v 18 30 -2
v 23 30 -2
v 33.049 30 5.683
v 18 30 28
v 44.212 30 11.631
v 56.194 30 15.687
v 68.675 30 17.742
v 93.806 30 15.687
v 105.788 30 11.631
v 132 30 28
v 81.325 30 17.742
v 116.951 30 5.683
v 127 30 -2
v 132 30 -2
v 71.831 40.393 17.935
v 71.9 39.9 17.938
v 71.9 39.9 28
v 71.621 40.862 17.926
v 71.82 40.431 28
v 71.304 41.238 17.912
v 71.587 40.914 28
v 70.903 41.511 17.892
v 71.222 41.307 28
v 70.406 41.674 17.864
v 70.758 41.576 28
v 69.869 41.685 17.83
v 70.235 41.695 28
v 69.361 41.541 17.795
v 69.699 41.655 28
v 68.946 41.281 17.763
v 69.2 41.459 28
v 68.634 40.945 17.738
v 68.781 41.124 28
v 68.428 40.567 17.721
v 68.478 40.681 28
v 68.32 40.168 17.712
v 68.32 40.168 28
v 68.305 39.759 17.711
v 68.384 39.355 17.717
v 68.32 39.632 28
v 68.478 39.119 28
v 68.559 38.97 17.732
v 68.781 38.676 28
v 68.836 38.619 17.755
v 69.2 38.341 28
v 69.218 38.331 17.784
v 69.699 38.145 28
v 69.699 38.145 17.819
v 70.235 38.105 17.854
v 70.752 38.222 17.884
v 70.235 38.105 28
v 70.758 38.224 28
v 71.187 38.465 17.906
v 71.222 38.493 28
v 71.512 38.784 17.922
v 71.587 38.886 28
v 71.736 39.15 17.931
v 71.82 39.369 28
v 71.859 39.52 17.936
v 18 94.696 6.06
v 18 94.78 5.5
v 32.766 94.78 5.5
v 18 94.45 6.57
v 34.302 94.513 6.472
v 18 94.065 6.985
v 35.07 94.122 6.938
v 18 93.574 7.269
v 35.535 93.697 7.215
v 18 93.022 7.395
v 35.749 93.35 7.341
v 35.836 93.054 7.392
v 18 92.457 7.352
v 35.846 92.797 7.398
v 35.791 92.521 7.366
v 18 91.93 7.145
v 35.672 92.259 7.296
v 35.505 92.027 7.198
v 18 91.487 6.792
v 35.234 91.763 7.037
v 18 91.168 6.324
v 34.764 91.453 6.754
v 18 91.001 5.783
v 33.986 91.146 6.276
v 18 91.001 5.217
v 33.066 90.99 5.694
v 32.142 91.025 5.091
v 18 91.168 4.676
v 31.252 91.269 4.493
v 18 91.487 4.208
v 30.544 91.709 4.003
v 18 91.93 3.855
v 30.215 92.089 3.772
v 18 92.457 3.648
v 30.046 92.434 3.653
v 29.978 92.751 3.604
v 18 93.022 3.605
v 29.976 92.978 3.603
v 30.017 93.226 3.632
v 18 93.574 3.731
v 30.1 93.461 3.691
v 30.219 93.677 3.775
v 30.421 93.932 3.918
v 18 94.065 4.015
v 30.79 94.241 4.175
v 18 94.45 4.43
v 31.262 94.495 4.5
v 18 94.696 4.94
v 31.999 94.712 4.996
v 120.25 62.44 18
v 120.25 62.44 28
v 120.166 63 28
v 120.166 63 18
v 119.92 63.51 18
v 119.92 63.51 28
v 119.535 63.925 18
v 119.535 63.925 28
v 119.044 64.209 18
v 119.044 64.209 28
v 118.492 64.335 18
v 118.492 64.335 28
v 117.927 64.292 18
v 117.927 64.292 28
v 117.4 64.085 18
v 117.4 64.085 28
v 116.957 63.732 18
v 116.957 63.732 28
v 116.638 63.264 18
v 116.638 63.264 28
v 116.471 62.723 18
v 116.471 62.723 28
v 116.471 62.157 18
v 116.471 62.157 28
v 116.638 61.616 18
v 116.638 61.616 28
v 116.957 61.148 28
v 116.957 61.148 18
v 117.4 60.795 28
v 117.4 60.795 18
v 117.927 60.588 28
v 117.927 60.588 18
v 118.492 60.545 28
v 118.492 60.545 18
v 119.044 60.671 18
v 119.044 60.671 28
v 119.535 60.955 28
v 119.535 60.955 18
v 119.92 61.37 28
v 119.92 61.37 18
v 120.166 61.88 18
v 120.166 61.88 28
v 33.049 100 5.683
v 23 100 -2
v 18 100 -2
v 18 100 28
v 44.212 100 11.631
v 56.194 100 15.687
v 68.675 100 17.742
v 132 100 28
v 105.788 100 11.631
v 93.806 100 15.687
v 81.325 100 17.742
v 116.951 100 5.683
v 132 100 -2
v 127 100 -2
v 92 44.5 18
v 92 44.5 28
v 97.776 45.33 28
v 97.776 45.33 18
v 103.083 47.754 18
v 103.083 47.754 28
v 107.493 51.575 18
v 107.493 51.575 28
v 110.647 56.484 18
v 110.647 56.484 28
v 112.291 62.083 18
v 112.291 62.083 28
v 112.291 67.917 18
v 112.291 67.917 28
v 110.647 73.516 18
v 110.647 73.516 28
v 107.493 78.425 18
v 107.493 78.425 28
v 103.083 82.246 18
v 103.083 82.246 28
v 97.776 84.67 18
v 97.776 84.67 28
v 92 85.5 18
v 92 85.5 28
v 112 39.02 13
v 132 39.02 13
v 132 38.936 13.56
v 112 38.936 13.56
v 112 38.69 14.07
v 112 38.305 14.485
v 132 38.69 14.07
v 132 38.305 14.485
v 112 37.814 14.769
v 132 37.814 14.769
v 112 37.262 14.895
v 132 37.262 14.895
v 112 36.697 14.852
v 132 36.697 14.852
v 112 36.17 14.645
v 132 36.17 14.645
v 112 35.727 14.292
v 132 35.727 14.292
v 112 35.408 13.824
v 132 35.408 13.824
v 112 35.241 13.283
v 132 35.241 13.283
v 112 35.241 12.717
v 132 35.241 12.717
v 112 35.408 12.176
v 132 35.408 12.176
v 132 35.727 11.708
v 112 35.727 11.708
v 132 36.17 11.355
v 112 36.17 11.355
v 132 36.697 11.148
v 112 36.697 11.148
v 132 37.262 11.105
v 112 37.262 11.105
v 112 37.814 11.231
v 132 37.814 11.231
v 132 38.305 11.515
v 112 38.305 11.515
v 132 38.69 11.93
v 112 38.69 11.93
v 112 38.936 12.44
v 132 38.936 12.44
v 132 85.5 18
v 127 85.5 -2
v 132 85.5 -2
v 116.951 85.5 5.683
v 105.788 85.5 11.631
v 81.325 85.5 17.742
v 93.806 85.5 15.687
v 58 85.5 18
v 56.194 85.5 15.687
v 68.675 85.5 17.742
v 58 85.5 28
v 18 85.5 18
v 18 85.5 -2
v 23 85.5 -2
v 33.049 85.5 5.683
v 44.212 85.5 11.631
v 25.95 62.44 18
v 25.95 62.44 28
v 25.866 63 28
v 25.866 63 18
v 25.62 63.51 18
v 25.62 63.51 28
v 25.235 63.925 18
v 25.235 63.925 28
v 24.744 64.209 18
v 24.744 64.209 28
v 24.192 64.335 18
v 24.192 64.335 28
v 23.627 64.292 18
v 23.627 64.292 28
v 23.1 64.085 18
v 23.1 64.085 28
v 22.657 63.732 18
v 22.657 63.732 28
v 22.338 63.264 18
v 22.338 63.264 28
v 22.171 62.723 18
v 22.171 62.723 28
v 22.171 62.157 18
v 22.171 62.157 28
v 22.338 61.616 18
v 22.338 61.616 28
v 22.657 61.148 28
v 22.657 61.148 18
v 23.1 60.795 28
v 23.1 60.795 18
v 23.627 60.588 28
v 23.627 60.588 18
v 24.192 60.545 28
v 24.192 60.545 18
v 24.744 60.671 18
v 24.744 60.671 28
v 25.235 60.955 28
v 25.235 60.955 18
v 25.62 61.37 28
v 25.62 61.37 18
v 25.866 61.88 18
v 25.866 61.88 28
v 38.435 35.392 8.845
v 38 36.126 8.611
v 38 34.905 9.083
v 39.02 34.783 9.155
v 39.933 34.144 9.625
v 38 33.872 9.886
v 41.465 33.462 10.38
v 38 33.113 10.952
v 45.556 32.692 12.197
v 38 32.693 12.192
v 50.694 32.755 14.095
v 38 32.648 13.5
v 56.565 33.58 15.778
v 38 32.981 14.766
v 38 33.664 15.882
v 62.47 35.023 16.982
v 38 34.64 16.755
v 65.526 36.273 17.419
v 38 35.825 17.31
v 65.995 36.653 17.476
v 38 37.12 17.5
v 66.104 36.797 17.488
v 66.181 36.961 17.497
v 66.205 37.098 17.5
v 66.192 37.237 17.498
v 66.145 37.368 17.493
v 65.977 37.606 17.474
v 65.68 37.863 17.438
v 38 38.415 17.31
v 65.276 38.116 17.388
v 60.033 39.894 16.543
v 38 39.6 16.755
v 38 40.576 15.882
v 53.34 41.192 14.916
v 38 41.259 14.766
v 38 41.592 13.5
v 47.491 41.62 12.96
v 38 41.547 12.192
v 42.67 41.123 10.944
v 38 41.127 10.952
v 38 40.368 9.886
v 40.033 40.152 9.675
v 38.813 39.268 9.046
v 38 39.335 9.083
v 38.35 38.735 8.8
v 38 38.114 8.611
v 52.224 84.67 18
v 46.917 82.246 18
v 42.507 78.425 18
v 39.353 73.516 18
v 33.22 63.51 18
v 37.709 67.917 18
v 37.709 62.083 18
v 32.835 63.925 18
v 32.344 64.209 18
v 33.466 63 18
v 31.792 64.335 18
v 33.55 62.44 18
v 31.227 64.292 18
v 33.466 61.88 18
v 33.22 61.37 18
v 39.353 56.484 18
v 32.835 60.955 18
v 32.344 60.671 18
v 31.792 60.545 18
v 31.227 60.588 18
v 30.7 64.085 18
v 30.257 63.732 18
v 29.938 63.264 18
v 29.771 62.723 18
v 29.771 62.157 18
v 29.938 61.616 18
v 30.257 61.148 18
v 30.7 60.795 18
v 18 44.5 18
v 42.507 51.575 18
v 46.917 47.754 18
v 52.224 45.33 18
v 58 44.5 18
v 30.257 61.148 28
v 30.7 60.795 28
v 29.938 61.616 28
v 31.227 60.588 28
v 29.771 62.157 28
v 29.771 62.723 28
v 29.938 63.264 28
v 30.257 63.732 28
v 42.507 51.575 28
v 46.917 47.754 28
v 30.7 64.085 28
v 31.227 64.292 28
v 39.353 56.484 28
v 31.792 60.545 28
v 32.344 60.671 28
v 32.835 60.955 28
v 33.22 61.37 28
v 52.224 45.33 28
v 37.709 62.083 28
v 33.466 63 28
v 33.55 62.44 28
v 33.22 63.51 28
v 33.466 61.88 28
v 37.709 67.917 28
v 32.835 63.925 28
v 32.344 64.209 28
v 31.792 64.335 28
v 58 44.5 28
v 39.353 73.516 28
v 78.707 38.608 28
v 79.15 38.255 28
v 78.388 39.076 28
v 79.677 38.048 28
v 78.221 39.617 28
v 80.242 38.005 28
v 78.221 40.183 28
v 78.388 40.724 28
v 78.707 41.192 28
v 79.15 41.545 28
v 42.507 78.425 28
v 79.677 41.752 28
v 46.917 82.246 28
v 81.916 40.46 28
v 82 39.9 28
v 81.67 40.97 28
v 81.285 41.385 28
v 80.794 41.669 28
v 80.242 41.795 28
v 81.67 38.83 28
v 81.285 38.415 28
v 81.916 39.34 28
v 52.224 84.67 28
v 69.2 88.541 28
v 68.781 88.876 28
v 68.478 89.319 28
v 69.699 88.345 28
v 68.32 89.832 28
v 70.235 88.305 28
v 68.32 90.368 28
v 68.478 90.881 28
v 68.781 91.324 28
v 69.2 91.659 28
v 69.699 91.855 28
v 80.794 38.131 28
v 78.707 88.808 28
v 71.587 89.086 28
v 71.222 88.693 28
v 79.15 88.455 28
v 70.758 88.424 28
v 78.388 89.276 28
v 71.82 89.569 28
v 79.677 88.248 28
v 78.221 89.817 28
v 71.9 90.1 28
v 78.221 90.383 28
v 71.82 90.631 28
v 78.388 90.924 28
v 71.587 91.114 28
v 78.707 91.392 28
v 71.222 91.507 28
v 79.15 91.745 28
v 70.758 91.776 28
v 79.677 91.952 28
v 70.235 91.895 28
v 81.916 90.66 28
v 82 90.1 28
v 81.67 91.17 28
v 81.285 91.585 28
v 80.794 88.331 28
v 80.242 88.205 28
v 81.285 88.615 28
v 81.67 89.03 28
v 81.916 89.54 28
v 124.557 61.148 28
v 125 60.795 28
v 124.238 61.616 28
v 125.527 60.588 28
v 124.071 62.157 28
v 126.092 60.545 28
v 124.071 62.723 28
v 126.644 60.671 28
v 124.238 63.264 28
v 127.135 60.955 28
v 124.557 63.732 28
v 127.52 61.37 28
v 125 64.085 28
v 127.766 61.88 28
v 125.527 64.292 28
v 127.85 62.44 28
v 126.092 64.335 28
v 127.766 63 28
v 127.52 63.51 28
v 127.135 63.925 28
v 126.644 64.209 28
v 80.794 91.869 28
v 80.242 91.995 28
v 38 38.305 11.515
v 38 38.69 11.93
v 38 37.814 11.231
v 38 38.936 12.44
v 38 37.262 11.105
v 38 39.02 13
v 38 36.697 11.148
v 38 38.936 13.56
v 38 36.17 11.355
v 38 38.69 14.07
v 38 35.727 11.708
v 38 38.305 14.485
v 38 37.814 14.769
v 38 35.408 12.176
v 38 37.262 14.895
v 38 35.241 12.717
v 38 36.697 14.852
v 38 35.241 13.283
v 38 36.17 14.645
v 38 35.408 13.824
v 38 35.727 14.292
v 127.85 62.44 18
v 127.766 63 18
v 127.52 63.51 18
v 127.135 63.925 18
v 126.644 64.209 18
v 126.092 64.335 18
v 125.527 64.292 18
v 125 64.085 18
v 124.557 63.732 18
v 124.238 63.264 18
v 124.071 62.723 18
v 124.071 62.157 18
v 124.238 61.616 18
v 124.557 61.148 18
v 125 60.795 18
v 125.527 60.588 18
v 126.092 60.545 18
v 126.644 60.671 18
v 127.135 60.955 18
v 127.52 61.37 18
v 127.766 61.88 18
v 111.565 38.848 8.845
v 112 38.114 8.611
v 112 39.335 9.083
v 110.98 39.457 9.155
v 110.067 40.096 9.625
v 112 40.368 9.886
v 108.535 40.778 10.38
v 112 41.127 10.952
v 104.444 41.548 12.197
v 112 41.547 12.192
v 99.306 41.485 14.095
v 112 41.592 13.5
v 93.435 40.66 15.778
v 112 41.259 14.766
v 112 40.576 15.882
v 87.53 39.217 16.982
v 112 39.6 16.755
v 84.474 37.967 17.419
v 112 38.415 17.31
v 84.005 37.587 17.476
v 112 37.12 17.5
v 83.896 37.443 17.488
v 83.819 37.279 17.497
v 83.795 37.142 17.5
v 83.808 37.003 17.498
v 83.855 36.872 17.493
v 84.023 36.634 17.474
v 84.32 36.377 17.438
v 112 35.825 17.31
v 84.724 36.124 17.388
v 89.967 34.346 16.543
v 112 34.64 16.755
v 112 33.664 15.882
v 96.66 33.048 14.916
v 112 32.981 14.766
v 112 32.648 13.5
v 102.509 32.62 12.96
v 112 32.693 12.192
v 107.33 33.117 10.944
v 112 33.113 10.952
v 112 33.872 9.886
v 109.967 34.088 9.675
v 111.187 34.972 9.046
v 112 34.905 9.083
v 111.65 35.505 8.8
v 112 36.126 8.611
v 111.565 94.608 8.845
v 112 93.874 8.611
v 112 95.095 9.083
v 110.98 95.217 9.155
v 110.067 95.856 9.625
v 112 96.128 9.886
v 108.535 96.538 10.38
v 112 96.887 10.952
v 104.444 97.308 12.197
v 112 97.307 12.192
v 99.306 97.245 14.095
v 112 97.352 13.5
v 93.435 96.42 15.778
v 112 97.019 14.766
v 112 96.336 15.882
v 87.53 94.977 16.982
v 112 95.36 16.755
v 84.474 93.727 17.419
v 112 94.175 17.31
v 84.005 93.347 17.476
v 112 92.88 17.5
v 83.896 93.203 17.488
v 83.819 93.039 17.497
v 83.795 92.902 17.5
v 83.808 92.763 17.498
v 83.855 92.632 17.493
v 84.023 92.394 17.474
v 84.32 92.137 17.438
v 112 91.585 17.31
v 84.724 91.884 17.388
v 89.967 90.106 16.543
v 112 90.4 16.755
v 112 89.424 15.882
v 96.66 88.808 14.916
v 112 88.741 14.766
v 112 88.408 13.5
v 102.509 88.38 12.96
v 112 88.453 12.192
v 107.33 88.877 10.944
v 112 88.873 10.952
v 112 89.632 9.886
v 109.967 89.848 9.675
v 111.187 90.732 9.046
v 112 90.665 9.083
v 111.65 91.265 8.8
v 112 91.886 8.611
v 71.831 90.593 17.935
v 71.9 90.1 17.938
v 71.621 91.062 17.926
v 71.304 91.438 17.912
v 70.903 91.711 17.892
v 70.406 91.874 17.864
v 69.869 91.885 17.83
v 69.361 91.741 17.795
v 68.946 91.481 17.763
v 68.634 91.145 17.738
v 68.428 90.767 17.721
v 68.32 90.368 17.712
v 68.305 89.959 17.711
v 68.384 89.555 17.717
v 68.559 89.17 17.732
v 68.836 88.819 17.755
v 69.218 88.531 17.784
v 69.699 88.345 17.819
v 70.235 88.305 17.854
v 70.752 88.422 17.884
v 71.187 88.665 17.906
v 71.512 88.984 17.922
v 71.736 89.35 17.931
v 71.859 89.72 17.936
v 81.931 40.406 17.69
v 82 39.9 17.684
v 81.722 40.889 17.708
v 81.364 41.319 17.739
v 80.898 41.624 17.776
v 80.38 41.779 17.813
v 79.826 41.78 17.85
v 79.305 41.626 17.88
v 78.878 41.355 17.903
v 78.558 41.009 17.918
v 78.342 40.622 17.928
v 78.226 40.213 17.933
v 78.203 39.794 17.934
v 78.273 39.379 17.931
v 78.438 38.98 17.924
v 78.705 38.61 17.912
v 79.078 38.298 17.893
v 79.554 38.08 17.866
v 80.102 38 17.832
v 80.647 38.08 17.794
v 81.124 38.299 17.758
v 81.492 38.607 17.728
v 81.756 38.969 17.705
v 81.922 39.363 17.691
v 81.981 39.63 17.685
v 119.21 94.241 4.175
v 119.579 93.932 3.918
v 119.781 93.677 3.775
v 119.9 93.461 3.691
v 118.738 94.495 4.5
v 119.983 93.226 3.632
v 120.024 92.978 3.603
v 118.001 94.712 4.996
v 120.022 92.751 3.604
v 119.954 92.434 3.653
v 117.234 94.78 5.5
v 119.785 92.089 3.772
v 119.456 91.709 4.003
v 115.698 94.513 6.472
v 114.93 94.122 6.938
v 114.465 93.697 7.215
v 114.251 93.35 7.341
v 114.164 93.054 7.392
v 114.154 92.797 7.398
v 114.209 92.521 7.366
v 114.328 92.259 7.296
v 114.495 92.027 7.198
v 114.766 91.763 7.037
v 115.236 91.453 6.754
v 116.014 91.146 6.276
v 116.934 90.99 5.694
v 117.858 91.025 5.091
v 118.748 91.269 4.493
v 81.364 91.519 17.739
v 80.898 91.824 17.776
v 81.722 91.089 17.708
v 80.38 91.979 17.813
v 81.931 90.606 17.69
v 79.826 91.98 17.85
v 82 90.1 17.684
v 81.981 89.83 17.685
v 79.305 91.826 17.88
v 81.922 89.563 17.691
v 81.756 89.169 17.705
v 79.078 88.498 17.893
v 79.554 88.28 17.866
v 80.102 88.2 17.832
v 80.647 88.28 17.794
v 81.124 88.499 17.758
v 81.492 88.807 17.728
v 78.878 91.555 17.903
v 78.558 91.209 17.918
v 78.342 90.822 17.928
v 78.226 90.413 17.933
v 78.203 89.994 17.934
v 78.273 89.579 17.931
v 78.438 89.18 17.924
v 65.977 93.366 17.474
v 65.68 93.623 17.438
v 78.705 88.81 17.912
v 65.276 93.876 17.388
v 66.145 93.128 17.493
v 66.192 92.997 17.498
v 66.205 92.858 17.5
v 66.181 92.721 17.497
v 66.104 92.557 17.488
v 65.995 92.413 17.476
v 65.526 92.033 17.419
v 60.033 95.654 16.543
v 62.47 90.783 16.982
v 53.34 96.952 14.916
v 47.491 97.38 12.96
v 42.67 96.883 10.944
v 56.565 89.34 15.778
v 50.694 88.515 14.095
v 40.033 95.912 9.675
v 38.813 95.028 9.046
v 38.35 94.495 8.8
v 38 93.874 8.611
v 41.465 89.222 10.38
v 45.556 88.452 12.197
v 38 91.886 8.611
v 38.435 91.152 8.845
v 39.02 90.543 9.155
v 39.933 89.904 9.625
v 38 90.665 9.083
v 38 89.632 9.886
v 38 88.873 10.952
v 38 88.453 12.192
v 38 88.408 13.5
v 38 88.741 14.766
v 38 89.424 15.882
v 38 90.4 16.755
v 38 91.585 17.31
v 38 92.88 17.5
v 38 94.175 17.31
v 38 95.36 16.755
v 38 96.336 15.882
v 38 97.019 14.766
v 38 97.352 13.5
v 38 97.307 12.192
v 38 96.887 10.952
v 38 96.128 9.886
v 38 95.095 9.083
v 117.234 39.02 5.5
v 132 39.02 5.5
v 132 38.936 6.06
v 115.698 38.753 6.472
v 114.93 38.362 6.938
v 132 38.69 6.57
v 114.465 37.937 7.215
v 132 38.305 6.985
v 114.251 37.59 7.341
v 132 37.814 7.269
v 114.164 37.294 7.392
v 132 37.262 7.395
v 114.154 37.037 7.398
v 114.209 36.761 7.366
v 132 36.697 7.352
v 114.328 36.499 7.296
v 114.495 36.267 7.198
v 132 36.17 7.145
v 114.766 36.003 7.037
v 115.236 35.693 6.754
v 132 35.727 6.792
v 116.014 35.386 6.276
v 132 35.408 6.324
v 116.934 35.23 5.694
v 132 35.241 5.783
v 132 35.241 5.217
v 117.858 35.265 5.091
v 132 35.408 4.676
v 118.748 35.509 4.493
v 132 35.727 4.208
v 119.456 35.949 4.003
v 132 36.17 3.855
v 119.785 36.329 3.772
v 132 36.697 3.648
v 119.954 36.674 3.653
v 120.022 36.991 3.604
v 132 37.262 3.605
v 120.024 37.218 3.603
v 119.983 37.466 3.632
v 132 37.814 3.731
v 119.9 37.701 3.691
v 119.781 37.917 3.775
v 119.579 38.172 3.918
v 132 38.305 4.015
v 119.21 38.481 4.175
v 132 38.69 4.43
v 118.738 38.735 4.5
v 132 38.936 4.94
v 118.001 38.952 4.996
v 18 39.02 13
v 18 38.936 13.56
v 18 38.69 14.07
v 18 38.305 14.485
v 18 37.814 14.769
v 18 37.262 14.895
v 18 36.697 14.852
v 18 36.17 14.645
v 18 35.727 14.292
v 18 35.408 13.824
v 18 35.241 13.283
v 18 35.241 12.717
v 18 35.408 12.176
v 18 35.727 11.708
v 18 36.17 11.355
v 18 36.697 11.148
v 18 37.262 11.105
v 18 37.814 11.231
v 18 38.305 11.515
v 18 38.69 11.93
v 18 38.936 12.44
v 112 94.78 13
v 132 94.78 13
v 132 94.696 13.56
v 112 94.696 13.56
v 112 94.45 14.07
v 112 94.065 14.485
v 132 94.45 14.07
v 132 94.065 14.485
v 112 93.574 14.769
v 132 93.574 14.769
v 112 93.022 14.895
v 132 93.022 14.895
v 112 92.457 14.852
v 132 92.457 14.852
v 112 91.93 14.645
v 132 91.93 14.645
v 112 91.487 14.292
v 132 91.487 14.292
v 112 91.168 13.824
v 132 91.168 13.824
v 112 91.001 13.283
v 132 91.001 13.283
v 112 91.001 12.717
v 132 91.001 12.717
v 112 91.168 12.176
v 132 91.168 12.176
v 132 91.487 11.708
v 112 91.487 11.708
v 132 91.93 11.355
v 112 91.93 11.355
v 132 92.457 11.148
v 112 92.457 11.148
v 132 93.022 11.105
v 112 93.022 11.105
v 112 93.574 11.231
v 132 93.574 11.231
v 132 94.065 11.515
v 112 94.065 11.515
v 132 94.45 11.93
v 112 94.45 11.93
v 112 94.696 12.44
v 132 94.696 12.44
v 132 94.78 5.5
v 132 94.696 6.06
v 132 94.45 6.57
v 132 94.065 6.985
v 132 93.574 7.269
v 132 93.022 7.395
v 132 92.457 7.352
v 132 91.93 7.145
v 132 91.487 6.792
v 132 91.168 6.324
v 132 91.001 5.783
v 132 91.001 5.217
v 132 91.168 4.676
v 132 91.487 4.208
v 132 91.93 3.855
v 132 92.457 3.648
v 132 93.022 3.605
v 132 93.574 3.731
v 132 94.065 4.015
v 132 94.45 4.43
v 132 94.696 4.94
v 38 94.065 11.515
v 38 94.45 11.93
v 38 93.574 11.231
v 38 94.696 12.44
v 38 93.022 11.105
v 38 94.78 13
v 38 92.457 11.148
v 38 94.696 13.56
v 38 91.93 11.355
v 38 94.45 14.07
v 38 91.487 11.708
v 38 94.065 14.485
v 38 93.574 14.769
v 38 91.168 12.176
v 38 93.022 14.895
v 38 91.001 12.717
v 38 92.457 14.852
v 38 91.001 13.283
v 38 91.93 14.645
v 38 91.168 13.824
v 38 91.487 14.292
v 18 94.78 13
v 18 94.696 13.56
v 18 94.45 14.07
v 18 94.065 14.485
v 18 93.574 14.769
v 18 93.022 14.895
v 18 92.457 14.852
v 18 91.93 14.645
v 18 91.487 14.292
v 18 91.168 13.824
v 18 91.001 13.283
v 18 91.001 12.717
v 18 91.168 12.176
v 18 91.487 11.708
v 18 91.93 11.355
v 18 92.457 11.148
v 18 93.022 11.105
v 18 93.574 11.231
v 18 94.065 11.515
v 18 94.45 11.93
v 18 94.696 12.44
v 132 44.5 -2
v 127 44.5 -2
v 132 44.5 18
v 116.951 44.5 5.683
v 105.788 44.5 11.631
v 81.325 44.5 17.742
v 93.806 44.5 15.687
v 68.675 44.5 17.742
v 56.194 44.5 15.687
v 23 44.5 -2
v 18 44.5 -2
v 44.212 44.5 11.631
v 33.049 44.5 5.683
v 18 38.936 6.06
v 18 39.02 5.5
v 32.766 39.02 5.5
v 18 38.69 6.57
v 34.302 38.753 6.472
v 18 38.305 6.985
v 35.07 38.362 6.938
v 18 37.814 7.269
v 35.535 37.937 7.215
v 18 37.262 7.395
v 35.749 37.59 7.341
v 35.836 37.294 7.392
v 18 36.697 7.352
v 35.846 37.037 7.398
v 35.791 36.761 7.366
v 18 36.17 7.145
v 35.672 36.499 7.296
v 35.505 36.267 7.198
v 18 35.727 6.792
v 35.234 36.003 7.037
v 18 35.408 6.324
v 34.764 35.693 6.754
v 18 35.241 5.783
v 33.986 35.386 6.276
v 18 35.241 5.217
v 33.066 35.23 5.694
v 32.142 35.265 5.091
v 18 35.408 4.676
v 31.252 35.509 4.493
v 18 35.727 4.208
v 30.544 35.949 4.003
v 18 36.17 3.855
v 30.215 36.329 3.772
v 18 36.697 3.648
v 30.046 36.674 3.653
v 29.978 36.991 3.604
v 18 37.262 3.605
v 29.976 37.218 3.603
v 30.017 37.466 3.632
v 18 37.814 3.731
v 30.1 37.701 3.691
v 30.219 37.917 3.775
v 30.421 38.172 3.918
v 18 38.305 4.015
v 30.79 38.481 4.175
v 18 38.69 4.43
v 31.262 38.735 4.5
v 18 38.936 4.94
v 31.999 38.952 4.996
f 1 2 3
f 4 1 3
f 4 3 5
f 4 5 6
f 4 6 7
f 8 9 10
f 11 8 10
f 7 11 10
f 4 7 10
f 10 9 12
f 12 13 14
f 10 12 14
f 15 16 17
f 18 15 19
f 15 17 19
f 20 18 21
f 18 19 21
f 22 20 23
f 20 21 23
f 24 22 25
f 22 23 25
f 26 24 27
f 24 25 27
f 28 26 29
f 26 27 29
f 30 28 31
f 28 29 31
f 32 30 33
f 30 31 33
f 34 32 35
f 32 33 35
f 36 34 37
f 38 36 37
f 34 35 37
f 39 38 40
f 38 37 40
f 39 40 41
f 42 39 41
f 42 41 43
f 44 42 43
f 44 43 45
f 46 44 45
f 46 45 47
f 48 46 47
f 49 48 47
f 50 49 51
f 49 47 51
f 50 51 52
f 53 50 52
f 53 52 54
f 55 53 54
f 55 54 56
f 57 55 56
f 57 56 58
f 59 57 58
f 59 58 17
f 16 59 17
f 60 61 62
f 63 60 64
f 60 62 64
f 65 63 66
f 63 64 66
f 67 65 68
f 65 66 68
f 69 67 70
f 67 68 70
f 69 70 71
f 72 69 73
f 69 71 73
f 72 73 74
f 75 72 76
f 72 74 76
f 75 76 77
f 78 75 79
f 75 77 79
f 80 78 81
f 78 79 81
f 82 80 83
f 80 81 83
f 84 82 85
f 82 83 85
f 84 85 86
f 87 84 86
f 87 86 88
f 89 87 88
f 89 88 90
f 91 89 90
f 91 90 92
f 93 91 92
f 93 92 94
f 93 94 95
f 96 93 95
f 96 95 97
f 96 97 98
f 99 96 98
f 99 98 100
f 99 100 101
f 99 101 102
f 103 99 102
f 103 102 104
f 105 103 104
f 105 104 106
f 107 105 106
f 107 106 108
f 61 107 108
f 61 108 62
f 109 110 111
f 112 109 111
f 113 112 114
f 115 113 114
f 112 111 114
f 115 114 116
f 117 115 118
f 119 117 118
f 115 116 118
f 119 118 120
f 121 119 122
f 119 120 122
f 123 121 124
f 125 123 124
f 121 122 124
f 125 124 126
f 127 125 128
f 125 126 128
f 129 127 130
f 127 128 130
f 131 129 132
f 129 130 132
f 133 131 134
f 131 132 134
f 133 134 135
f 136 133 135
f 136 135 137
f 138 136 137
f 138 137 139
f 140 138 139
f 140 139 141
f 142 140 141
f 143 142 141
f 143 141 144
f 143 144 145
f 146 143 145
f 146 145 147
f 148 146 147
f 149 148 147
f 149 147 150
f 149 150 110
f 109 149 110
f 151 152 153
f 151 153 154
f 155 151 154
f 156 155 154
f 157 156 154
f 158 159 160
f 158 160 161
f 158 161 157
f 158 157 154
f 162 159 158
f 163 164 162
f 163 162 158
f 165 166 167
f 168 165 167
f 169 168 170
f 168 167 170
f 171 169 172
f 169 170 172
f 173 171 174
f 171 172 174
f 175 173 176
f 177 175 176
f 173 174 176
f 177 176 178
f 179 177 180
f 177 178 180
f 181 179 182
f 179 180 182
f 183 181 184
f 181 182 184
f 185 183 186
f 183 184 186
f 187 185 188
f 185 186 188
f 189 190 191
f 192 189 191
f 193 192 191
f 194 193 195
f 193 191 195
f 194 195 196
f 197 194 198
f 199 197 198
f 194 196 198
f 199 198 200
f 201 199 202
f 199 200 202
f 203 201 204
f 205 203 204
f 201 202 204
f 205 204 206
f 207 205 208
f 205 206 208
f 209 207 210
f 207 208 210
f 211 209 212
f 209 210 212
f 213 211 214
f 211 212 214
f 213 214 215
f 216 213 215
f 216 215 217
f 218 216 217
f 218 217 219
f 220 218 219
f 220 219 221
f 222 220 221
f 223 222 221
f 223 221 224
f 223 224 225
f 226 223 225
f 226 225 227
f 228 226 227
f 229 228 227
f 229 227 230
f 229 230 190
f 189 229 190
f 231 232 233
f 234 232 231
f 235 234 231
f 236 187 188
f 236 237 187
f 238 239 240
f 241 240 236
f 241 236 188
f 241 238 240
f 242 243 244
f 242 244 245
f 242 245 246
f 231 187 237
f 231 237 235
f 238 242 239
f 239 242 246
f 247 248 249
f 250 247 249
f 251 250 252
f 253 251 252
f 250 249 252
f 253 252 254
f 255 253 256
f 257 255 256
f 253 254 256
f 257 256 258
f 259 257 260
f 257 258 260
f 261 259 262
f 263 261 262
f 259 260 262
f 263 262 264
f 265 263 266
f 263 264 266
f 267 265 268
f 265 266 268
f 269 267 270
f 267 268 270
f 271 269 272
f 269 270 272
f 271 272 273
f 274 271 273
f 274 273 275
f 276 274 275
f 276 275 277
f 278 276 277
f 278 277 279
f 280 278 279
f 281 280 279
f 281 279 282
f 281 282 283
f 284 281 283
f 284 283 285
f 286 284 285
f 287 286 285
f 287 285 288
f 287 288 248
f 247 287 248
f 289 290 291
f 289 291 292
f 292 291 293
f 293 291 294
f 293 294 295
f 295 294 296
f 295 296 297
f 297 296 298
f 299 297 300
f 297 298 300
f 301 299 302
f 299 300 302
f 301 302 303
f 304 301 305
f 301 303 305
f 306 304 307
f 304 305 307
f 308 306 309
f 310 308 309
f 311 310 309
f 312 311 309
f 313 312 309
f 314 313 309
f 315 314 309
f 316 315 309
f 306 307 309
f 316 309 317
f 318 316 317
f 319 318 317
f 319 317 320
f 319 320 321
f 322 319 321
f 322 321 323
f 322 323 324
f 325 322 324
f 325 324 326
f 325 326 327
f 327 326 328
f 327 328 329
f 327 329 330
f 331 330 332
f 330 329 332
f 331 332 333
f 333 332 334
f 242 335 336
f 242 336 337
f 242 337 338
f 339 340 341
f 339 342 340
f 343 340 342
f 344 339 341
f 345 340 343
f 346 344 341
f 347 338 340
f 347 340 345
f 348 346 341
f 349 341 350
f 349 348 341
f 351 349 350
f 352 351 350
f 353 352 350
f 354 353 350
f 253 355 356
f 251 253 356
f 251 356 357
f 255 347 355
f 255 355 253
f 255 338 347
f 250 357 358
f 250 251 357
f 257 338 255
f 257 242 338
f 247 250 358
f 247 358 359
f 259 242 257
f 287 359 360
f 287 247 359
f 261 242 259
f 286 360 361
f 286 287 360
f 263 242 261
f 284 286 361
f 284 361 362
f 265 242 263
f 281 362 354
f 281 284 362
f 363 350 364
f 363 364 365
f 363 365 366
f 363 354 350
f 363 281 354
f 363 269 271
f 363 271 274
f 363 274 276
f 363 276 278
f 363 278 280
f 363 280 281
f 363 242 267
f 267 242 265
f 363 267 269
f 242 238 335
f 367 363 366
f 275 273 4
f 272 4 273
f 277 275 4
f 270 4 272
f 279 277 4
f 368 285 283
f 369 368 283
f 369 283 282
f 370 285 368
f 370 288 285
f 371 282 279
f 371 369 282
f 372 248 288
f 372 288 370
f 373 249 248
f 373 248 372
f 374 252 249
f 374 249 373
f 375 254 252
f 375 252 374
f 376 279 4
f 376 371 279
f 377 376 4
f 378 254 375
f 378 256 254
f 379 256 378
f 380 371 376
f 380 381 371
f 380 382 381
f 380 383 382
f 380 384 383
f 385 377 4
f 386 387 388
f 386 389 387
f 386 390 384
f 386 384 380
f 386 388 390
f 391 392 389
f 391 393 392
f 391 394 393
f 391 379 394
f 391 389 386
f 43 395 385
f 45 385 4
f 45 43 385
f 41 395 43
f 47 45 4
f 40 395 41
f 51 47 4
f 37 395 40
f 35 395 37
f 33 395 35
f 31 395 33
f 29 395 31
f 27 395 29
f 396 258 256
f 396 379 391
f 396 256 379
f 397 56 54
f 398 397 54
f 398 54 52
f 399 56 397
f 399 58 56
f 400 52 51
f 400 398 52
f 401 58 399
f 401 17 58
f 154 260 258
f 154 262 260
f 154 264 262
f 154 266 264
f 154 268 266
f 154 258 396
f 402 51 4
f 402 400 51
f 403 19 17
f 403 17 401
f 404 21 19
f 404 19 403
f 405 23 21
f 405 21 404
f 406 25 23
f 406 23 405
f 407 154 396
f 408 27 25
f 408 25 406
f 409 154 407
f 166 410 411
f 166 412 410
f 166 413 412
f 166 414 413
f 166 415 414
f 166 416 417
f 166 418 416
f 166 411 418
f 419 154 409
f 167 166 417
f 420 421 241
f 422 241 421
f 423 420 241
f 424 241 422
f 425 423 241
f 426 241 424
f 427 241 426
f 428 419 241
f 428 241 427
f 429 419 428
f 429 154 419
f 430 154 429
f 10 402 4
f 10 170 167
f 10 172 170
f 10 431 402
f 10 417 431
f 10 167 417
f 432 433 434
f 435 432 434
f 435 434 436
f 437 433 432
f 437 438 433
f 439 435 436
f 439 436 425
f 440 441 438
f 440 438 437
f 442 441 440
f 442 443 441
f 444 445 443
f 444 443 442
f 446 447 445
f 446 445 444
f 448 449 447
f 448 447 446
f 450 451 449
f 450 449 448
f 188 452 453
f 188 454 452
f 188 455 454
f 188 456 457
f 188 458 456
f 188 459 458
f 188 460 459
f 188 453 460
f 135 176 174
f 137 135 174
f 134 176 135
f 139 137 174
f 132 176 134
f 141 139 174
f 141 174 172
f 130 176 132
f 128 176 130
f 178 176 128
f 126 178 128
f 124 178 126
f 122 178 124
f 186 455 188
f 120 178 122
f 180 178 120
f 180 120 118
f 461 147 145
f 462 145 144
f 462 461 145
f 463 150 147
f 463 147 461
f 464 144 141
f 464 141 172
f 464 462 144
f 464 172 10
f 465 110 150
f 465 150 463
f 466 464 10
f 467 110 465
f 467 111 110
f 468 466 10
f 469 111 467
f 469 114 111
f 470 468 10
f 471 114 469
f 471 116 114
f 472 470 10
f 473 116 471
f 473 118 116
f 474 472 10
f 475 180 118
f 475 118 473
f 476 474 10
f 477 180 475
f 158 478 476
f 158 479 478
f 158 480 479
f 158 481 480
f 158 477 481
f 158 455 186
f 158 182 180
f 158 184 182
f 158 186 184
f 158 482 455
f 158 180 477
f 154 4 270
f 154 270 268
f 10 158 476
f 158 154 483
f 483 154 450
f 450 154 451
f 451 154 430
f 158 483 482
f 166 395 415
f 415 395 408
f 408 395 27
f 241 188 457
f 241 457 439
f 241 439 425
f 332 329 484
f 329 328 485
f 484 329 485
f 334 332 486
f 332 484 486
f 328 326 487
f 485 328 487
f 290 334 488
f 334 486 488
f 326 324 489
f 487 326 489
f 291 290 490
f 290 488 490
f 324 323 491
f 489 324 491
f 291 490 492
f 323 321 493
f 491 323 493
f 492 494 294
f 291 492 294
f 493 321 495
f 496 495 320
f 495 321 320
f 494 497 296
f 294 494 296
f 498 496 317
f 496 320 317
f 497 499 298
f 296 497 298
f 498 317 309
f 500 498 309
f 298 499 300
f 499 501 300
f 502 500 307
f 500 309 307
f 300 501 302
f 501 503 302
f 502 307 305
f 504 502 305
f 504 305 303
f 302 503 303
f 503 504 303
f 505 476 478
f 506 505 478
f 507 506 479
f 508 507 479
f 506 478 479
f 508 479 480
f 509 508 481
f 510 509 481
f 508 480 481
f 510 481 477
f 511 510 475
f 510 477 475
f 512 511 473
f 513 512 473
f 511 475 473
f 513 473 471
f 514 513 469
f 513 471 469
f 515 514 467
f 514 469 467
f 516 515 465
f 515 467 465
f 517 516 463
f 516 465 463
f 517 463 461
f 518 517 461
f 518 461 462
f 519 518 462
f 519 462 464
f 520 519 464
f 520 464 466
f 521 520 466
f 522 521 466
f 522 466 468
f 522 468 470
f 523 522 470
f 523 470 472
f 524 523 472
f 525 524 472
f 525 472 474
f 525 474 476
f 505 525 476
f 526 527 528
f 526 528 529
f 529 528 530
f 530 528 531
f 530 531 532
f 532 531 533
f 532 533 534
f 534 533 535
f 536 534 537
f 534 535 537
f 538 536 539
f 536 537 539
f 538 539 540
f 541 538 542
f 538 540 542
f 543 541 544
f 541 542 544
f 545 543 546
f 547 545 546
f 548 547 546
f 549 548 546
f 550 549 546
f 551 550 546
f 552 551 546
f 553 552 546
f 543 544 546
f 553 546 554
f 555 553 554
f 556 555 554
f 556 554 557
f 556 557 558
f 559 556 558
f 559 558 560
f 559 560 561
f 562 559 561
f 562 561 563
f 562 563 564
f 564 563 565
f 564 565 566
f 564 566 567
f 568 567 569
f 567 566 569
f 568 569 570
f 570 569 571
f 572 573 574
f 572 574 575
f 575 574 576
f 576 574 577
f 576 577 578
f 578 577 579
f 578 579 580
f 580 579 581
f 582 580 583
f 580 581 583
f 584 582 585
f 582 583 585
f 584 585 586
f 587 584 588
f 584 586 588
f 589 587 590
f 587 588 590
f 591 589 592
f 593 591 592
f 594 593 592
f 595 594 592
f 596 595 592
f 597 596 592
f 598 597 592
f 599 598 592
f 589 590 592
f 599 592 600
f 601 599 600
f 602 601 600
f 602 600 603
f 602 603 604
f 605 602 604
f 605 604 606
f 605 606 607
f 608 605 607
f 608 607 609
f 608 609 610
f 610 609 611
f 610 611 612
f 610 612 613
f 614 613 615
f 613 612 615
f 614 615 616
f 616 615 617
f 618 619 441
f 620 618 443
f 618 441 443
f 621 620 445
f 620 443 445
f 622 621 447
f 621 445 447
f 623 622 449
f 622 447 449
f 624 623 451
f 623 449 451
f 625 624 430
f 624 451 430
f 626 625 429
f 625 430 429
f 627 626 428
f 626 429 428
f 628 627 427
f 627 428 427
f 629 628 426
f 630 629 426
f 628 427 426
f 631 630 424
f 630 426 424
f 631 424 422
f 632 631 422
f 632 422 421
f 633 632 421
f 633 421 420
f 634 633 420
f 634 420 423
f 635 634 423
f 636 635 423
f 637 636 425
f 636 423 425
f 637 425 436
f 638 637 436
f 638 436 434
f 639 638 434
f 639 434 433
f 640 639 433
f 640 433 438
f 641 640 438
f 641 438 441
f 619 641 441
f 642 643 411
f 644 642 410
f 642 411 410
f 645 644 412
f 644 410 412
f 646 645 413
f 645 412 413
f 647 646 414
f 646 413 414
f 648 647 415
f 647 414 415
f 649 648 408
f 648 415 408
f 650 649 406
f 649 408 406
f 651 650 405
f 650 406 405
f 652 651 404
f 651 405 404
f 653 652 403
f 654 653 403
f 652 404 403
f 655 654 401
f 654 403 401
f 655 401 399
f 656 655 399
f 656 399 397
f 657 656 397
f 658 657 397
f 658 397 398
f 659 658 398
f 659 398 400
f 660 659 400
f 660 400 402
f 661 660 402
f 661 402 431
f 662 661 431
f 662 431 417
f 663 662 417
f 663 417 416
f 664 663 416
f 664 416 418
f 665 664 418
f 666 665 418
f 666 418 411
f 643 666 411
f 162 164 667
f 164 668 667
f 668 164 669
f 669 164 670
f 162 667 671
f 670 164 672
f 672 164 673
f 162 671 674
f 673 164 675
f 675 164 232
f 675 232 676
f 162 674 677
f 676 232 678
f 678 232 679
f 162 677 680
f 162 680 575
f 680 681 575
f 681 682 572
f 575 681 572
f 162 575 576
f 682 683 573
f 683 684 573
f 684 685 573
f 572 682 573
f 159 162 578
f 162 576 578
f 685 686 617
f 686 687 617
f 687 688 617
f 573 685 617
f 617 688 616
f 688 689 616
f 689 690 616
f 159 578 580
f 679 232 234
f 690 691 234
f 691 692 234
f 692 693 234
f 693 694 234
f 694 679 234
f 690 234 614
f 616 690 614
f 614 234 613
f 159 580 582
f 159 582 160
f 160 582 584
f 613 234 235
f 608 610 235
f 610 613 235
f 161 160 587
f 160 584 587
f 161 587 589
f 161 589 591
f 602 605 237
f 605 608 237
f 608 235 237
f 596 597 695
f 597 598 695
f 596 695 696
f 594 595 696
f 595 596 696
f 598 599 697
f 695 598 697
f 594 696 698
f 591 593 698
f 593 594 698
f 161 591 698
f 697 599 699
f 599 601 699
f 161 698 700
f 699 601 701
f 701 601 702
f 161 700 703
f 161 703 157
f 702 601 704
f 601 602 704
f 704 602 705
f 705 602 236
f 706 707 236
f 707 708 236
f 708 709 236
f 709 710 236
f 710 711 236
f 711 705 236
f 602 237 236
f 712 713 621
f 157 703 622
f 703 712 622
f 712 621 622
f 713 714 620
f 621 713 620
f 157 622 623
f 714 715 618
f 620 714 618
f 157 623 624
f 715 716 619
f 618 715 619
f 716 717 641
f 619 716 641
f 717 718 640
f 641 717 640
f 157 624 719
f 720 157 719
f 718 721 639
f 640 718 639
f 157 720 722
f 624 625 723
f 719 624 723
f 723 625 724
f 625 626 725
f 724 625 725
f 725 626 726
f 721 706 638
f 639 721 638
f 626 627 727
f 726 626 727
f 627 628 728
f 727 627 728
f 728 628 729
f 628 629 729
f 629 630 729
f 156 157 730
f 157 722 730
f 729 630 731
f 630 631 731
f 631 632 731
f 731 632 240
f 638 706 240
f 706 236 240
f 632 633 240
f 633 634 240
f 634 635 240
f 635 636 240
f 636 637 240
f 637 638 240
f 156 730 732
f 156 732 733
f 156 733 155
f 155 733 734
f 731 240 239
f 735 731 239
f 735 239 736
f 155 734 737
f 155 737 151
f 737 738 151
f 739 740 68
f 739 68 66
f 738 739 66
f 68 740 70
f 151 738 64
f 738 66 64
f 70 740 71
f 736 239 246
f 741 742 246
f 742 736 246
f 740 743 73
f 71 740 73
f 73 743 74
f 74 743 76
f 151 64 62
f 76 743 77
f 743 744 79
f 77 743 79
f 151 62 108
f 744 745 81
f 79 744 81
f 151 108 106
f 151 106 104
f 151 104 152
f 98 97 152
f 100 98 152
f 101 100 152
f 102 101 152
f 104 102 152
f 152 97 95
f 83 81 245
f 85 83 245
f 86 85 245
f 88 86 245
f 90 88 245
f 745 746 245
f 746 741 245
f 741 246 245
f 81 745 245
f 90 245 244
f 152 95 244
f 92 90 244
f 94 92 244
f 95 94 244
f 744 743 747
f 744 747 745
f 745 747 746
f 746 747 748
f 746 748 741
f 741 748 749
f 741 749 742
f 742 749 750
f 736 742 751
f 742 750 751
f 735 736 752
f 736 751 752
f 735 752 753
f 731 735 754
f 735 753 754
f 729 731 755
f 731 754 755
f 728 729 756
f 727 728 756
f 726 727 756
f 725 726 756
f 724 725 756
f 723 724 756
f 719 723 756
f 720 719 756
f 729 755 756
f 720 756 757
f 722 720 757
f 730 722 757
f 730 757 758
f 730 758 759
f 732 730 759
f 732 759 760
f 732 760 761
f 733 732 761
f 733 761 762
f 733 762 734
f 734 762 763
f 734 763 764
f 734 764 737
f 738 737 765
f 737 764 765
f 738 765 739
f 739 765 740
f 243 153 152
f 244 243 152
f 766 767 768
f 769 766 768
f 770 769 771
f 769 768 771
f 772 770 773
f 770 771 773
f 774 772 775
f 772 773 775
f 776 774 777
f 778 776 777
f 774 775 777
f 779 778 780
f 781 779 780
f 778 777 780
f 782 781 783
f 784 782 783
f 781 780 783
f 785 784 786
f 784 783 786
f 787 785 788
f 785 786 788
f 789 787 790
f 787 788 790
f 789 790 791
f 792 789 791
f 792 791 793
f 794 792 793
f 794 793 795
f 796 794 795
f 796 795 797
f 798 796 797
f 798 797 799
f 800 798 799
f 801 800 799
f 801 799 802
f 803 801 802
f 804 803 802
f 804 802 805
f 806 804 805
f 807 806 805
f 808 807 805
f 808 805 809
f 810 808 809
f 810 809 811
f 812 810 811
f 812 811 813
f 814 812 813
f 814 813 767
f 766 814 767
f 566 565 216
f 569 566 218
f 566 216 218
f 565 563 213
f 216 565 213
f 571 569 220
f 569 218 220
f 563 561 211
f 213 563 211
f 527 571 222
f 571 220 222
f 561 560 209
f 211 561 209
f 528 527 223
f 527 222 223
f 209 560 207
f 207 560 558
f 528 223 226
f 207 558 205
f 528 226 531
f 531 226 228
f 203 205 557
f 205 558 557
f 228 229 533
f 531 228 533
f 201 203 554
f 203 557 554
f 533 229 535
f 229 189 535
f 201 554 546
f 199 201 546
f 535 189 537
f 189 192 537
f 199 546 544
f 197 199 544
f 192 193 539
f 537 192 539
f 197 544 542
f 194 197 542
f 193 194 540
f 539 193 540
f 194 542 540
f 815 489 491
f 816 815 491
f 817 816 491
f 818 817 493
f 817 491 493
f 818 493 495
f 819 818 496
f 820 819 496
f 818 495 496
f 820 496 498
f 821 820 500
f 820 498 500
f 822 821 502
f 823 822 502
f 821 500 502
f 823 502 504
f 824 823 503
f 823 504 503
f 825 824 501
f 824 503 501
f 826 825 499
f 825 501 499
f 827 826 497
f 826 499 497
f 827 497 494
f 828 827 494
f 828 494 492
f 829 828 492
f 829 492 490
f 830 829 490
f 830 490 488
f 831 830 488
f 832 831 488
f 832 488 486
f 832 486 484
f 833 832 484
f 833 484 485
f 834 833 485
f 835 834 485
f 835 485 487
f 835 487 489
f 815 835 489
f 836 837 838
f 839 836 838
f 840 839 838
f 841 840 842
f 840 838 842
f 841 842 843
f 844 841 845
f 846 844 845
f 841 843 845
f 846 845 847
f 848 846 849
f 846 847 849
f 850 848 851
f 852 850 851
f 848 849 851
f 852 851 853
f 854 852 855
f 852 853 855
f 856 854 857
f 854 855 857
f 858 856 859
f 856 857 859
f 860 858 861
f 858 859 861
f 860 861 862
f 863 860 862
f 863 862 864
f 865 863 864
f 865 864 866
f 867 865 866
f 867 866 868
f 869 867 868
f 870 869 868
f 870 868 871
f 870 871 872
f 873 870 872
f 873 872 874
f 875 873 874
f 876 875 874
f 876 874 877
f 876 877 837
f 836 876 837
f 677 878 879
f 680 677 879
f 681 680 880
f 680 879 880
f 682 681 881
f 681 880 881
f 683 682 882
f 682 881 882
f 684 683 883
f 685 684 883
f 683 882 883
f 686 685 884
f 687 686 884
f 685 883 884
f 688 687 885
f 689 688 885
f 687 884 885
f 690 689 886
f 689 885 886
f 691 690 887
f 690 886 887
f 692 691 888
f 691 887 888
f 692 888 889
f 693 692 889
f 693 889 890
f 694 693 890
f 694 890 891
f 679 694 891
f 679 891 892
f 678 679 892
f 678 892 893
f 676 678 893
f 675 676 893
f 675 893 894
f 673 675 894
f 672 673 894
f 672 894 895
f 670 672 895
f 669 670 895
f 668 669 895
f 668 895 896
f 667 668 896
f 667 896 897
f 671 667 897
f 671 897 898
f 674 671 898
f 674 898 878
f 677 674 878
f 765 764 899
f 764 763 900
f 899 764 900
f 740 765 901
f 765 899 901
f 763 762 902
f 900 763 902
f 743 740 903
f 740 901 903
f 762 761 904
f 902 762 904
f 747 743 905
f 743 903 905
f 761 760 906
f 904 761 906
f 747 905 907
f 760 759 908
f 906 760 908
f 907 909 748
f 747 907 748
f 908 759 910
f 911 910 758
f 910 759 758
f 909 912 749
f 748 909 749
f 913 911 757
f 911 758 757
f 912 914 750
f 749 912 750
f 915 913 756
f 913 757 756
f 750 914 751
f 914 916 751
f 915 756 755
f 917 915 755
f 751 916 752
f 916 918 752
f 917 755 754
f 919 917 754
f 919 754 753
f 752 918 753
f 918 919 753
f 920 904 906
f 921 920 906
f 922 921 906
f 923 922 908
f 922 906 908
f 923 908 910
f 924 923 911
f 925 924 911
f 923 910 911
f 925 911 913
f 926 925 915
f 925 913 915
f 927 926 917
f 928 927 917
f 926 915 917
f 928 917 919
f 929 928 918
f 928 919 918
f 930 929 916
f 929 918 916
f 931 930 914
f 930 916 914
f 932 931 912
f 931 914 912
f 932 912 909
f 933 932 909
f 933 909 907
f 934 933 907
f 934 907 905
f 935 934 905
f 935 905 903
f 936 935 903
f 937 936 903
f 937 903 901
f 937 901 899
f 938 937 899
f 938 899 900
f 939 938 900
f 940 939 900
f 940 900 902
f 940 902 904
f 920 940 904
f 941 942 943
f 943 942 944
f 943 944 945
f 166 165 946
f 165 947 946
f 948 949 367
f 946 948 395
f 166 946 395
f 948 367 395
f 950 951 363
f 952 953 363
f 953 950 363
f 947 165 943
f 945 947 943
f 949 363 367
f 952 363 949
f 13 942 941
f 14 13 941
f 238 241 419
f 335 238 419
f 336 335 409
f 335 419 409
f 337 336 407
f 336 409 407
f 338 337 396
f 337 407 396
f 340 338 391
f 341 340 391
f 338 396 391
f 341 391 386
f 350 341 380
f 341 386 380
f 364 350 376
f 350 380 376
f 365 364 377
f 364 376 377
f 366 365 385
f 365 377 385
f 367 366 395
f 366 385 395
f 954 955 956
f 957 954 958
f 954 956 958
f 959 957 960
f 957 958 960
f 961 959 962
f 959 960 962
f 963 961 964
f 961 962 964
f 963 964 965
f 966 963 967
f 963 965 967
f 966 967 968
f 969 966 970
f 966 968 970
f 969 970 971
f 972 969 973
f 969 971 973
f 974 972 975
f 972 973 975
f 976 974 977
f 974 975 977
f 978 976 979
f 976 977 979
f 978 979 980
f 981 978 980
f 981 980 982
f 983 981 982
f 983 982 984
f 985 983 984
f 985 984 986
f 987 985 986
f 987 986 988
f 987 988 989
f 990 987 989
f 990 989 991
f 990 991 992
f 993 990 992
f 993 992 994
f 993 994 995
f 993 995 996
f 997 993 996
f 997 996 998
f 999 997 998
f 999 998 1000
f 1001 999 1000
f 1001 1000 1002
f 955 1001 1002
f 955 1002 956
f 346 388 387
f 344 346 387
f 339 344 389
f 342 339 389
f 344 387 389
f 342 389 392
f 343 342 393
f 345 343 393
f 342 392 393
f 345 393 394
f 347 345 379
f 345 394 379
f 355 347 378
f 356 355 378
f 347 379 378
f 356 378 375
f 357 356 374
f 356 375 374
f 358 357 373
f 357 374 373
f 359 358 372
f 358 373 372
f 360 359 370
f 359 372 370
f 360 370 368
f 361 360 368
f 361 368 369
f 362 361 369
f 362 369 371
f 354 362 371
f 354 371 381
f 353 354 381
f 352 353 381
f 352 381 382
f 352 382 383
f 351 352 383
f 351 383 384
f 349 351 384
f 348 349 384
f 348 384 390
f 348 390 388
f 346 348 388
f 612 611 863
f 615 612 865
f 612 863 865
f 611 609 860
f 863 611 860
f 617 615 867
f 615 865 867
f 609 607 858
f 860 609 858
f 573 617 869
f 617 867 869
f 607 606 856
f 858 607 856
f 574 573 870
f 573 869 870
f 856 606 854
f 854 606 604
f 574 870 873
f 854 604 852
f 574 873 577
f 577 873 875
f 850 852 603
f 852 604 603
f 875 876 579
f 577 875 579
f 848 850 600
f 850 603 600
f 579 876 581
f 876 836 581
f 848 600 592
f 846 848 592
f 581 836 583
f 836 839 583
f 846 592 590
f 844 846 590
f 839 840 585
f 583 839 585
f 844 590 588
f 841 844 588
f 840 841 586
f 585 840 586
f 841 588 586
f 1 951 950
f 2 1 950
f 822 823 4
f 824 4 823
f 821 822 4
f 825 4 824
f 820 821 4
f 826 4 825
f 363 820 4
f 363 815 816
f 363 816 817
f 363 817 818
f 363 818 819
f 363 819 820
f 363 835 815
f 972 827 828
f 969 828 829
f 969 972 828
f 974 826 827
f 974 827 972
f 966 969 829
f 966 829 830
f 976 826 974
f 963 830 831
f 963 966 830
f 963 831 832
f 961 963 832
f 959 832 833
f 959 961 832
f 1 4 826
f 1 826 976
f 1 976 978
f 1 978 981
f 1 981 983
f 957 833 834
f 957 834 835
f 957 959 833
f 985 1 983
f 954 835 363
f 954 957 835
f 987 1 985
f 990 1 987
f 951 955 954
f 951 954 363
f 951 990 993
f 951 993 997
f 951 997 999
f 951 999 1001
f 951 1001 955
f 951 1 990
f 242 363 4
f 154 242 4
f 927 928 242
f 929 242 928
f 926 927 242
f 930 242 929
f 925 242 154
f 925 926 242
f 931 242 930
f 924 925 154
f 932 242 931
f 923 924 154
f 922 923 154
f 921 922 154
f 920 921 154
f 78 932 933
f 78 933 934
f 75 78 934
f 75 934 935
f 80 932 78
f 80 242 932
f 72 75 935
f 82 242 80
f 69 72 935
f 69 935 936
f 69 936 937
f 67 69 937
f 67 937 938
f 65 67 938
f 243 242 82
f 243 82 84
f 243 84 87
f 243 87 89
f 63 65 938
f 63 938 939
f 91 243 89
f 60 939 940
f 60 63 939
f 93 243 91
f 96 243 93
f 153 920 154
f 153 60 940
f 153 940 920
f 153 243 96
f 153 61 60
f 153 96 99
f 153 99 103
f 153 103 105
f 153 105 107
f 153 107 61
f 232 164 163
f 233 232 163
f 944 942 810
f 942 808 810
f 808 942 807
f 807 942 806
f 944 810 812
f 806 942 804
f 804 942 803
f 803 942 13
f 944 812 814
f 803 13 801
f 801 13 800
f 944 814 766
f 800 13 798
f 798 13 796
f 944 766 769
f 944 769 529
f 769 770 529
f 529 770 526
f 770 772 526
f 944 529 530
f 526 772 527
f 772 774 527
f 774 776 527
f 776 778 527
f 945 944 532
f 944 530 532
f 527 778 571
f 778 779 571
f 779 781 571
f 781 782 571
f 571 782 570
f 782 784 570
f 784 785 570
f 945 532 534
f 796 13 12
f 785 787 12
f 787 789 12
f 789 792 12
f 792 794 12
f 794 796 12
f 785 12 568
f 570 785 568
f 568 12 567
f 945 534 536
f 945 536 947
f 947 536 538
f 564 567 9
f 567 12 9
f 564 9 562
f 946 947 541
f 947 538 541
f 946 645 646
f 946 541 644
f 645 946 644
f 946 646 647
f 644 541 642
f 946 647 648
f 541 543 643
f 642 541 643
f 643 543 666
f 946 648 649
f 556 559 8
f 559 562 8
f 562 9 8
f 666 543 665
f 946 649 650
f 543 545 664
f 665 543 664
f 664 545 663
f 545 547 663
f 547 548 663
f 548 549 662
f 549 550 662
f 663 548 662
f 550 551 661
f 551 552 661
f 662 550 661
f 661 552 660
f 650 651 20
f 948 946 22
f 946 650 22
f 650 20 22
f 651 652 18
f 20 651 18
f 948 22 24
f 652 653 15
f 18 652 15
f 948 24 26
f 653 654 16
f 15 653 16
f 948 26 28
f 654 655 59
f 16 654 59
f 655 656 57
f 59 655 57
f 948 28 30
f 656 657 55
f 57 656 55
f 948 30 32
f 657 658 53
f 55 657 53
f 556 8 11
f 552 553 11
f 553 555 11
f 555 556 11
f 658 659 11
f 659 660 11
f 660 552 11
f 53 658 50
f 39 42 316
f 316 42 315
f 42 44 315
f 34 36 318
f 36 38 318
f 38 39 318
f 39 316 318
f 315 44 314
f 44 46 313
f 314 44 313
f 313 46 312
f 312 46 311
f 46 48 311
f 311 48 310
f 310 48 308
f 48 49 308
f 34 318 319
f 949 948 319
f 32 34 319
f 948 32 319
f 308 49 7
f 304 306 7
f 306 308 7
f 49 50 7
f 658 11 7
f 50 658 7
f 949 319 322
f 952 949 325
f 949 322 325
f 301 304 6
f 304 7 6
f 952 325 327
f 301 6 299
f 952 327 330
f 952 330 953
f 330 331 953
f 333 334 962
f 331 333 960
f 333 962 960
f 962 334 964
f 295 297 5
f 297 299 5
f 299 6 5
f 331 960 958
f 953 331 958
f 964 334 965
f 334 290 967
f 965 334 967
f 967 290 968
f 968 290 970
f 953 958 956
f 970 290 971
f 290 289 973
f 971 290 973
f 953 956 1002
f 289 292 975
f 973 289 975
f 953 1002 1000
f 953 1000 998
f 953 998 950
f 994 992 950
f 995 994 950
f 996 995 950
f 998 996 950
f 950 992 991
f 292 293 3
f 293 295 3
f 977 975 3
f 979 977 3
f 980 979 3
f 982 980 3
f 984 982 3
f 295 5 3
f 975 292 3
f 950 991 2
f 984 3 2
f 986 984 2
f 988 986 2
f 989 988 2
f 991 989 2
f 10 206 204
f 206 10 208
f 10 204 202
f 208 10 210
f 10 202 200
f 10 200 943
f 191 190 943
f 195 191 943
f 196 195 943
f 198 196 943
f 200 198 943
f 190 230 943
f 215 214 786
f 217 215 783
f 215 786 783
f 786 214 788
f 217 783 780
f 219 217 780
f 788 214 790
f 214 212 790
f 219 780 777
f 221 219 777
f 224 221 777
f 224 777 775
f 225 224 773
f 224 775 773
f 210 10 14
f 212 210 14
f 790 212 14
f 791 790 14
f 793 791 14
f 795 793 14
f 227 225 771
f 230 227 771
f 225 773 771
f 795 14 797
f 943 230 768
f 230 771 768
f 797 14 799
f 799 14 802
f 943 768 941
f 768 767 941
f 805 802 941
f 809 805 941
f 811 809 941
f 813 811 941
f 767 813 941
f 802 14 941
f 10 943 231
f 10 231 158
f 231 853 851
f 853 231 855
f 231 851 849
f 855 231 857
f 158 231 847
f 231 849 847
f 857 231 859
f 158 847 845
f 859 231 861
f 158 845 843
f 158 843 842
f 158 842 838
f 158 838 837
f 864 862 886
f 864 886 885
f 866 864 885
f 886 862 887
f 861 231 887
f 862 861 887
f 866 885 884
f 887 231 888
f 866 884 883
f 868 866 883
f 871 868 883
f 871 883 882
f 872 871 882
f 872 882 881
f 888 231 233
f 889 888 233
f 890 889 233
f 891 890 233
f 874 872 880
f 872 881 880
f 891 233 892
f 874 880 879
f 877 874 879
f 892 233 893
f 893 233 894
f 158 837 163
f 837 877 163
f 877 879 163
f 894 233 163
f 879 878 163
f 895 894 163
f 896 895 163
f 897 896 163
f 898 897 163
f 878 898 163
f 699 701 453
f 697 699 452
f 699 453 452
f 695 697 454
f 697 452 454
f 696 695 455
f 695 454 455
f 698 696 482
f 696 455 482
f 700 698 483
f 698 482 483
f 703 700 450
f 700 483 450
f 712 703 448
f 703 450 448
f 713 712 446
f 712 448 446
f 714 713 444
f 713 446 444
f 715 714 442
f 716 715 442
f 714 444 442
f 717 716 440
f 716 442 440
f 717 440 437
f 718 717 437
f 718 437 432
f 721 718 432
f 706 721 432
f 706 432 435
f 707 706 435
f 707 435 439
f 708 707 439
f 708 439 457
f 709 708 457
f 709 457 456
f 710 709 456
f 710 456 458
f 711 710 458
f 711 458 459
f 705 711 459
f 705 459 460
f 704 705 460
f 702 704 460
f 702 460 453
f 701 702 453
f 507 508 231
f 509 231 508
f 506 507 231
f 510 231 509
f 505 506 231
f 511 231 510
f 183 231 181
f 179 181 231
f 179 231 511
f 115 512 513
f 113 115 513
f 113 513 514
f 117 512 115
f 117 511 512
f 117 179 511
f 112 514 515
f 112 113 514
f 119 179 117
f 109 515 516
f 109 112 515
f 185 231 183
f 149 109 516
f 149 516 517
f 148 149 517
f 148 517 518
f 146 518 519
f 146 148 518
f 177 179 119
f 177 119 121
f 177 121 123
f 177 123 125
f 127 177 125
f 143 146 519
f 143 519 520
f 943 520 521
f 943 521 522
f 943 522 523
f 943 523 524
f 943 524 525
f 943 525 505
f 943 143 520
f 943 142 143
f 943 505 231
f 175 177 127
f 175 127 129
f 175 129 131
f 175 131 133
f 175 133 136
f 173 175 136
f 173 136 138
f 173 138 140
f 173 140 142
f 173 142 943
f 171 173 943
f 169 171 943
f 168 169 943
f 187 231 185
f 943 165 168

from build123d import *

# Parameters (mm, degrees)
SKETCH090_W     = 114
SKETCH090_H     = 70
PAD024_DEPTH    = 30
POCKET058_DEPTH = 30.001
POCKET059_DEPTH = 70.001
SKETCH092_W     = 41
SKETCH092_H     = 20
POCKET060_DEPTH = 114.001
SKETCH093_R     = 1.8
SKETCH093_R_2   = 1.9
POCKET061_DEPTH = 30.001
SKETCH094_R     = 1.9
POCKET062_DEPTH = 114.001
SKETCH095_R     = 4.5
POCKET063_DEPTH = 29
SKETCH096_R     = 4.5
POCKET064_DEPTH = 29
SKETCH097_R     = 1.9
POCKET065_DEPTH = 30.001


with BuildPart() as part:
    # Sketch090 → Pad024 (new body)
    with BuildSketch(Plane.XY):
        with Locations((57, 35)):
            Rectangle(SKETCH090_W, SKETCH090_H)
    extrude(amount=PAD024_DEPTH)

    # Sketch091 (on Face6 of Pad024) → Pocket058 (cut, through all)
    with BuildSketch(Plane.XY.offset(30)):
        with BuildLine():
            Line((40, 14.5), (74, 14.5))
            ThreePointArc((74, 14.5), (94.5, 35), (74, 55.5))
            Line((74, 55.5), (40, 55.5))
            ThreePointArc((40, 55.5), (19.5, 35), (40, 14.5))
        make_face()
    extrude(amount=-POCKET058_DEPTH, mode=Mode.SUBTRACT)

    # Sketch069 (on Face1 of Pocket058) → Pocket059 (cut, through all)
    with BuildSketch(Plane.XZ):
        with BuildLine():
            Line((5, 0), (109, 0))
            ThreePointArc((109, 0), (57, 20), (5, 0))
        make_face()
    extrude(amount=-POCKET059_DEPTH, mode=Mode.SUBTRACT)

    # Sketch092 (on Face7 of Pocket059) → Pocket060 (cut, through all)
    with BuildSketch(Plane(origin=(0, 0, 0), x_dir=(0, -1, 0), z_dir=(-1, 0, 0))):
        with Locations((-35, 10)):
            Rectangle(SKETCH092_W, SKETCH092_H)
    extrude(amount=-POCKET060_DEPTH, mode=Mode.SUBTRACT)

    # Sketch093 (on Face6 of Pocket060) → Pocket061 (cut, through all)
    with BuildSketch(Plane.XY.offset(30)):
        with Locations((52.1, 60.1)):
            Circle(SKETCH093_R)
        with Locations((62.1, 60.1)):
            Circle(SKETCH093_R_2)
        with Locations((52.1, 9.9)):
            Circle(SKETCH093_R)
        with Locations((62.1, 9.9)):
            Circle(SKETCH093_R_2)
    extrude(amount=-POCKET061_DEPTH, mode=Mode.SUBTRACT)

    # Sketch094 (on Face5 of Pocket061) → Pocket062 (cut, through all)
    with BuildSketch(Plane.YZ.offset(114)):
        with Locations((7.12, 15)):
            Circle(SKETCH094_R)
        with Locations((7.12, 7.5)):
            Circle(SKETCH094_R)
        with Locations((62.88, 15)):
            Circle(SKETCH094_R)
        with Locations((62.88, 7.5)):
            Circle(SKETCH094_R)
    extrude(amount=-POCKET062_DEPTH, mode=Mode.SUBTRACT)

    # Sketch095 (on DatumPlane) → Pocket063 (cut)
    with BuildSketch(Plane.YZ.offset(94)):
        with Locations((7.12, 15)):
            Circle(SKETCH095_R)
        with Locations((62.88, 15)):
            Circle(SKETCH095_R)
    extrude(amount=-POCKET063_DEPTH, mode=Mode.SUBTRACT)

    # Sketch096 (on DatumPlane) → Pocket064 (cut)
    with BuildSketch(Plane(origin=(20, 0, 0), x_dir=(0, -1, 0), z_dir=(-1, 0, 0))):
        with Locations((-62.88, 15)):
            Circle(SKETCH096_R)
        with Locations((-7.12, 15)):
            Circle(SKETCH096_R)
    extrude(amount=-POCKET064_DEPTH, mode=Mode.SUBTRACT)

    # Sketch097 (on Face6 of Pocket064) → Pocket065 (cut, through all)
    with BuildSketch(Plane.XY.offset(30)):
        with Locations((100.35, 32.44)):
            Circle(SKETCH097_R)
        with Locations((107.95, 32.44)):
            Circle(SKETCH097_R)
        with Locations((6.05, 32.44)):
            Circle(SKETCH097_R)
        with Locations((13.65, 32.44)):
            Circle(SKETCH097_R)
    extrude(amount=-POCKET065_DEPTH, mode=Mode.SUBTRACT)


with BuildPart() as part_1:
    # Body010 placement: moved
    add(part.part.moved(Location((18, 30, -2))))


solid = part_1.part
